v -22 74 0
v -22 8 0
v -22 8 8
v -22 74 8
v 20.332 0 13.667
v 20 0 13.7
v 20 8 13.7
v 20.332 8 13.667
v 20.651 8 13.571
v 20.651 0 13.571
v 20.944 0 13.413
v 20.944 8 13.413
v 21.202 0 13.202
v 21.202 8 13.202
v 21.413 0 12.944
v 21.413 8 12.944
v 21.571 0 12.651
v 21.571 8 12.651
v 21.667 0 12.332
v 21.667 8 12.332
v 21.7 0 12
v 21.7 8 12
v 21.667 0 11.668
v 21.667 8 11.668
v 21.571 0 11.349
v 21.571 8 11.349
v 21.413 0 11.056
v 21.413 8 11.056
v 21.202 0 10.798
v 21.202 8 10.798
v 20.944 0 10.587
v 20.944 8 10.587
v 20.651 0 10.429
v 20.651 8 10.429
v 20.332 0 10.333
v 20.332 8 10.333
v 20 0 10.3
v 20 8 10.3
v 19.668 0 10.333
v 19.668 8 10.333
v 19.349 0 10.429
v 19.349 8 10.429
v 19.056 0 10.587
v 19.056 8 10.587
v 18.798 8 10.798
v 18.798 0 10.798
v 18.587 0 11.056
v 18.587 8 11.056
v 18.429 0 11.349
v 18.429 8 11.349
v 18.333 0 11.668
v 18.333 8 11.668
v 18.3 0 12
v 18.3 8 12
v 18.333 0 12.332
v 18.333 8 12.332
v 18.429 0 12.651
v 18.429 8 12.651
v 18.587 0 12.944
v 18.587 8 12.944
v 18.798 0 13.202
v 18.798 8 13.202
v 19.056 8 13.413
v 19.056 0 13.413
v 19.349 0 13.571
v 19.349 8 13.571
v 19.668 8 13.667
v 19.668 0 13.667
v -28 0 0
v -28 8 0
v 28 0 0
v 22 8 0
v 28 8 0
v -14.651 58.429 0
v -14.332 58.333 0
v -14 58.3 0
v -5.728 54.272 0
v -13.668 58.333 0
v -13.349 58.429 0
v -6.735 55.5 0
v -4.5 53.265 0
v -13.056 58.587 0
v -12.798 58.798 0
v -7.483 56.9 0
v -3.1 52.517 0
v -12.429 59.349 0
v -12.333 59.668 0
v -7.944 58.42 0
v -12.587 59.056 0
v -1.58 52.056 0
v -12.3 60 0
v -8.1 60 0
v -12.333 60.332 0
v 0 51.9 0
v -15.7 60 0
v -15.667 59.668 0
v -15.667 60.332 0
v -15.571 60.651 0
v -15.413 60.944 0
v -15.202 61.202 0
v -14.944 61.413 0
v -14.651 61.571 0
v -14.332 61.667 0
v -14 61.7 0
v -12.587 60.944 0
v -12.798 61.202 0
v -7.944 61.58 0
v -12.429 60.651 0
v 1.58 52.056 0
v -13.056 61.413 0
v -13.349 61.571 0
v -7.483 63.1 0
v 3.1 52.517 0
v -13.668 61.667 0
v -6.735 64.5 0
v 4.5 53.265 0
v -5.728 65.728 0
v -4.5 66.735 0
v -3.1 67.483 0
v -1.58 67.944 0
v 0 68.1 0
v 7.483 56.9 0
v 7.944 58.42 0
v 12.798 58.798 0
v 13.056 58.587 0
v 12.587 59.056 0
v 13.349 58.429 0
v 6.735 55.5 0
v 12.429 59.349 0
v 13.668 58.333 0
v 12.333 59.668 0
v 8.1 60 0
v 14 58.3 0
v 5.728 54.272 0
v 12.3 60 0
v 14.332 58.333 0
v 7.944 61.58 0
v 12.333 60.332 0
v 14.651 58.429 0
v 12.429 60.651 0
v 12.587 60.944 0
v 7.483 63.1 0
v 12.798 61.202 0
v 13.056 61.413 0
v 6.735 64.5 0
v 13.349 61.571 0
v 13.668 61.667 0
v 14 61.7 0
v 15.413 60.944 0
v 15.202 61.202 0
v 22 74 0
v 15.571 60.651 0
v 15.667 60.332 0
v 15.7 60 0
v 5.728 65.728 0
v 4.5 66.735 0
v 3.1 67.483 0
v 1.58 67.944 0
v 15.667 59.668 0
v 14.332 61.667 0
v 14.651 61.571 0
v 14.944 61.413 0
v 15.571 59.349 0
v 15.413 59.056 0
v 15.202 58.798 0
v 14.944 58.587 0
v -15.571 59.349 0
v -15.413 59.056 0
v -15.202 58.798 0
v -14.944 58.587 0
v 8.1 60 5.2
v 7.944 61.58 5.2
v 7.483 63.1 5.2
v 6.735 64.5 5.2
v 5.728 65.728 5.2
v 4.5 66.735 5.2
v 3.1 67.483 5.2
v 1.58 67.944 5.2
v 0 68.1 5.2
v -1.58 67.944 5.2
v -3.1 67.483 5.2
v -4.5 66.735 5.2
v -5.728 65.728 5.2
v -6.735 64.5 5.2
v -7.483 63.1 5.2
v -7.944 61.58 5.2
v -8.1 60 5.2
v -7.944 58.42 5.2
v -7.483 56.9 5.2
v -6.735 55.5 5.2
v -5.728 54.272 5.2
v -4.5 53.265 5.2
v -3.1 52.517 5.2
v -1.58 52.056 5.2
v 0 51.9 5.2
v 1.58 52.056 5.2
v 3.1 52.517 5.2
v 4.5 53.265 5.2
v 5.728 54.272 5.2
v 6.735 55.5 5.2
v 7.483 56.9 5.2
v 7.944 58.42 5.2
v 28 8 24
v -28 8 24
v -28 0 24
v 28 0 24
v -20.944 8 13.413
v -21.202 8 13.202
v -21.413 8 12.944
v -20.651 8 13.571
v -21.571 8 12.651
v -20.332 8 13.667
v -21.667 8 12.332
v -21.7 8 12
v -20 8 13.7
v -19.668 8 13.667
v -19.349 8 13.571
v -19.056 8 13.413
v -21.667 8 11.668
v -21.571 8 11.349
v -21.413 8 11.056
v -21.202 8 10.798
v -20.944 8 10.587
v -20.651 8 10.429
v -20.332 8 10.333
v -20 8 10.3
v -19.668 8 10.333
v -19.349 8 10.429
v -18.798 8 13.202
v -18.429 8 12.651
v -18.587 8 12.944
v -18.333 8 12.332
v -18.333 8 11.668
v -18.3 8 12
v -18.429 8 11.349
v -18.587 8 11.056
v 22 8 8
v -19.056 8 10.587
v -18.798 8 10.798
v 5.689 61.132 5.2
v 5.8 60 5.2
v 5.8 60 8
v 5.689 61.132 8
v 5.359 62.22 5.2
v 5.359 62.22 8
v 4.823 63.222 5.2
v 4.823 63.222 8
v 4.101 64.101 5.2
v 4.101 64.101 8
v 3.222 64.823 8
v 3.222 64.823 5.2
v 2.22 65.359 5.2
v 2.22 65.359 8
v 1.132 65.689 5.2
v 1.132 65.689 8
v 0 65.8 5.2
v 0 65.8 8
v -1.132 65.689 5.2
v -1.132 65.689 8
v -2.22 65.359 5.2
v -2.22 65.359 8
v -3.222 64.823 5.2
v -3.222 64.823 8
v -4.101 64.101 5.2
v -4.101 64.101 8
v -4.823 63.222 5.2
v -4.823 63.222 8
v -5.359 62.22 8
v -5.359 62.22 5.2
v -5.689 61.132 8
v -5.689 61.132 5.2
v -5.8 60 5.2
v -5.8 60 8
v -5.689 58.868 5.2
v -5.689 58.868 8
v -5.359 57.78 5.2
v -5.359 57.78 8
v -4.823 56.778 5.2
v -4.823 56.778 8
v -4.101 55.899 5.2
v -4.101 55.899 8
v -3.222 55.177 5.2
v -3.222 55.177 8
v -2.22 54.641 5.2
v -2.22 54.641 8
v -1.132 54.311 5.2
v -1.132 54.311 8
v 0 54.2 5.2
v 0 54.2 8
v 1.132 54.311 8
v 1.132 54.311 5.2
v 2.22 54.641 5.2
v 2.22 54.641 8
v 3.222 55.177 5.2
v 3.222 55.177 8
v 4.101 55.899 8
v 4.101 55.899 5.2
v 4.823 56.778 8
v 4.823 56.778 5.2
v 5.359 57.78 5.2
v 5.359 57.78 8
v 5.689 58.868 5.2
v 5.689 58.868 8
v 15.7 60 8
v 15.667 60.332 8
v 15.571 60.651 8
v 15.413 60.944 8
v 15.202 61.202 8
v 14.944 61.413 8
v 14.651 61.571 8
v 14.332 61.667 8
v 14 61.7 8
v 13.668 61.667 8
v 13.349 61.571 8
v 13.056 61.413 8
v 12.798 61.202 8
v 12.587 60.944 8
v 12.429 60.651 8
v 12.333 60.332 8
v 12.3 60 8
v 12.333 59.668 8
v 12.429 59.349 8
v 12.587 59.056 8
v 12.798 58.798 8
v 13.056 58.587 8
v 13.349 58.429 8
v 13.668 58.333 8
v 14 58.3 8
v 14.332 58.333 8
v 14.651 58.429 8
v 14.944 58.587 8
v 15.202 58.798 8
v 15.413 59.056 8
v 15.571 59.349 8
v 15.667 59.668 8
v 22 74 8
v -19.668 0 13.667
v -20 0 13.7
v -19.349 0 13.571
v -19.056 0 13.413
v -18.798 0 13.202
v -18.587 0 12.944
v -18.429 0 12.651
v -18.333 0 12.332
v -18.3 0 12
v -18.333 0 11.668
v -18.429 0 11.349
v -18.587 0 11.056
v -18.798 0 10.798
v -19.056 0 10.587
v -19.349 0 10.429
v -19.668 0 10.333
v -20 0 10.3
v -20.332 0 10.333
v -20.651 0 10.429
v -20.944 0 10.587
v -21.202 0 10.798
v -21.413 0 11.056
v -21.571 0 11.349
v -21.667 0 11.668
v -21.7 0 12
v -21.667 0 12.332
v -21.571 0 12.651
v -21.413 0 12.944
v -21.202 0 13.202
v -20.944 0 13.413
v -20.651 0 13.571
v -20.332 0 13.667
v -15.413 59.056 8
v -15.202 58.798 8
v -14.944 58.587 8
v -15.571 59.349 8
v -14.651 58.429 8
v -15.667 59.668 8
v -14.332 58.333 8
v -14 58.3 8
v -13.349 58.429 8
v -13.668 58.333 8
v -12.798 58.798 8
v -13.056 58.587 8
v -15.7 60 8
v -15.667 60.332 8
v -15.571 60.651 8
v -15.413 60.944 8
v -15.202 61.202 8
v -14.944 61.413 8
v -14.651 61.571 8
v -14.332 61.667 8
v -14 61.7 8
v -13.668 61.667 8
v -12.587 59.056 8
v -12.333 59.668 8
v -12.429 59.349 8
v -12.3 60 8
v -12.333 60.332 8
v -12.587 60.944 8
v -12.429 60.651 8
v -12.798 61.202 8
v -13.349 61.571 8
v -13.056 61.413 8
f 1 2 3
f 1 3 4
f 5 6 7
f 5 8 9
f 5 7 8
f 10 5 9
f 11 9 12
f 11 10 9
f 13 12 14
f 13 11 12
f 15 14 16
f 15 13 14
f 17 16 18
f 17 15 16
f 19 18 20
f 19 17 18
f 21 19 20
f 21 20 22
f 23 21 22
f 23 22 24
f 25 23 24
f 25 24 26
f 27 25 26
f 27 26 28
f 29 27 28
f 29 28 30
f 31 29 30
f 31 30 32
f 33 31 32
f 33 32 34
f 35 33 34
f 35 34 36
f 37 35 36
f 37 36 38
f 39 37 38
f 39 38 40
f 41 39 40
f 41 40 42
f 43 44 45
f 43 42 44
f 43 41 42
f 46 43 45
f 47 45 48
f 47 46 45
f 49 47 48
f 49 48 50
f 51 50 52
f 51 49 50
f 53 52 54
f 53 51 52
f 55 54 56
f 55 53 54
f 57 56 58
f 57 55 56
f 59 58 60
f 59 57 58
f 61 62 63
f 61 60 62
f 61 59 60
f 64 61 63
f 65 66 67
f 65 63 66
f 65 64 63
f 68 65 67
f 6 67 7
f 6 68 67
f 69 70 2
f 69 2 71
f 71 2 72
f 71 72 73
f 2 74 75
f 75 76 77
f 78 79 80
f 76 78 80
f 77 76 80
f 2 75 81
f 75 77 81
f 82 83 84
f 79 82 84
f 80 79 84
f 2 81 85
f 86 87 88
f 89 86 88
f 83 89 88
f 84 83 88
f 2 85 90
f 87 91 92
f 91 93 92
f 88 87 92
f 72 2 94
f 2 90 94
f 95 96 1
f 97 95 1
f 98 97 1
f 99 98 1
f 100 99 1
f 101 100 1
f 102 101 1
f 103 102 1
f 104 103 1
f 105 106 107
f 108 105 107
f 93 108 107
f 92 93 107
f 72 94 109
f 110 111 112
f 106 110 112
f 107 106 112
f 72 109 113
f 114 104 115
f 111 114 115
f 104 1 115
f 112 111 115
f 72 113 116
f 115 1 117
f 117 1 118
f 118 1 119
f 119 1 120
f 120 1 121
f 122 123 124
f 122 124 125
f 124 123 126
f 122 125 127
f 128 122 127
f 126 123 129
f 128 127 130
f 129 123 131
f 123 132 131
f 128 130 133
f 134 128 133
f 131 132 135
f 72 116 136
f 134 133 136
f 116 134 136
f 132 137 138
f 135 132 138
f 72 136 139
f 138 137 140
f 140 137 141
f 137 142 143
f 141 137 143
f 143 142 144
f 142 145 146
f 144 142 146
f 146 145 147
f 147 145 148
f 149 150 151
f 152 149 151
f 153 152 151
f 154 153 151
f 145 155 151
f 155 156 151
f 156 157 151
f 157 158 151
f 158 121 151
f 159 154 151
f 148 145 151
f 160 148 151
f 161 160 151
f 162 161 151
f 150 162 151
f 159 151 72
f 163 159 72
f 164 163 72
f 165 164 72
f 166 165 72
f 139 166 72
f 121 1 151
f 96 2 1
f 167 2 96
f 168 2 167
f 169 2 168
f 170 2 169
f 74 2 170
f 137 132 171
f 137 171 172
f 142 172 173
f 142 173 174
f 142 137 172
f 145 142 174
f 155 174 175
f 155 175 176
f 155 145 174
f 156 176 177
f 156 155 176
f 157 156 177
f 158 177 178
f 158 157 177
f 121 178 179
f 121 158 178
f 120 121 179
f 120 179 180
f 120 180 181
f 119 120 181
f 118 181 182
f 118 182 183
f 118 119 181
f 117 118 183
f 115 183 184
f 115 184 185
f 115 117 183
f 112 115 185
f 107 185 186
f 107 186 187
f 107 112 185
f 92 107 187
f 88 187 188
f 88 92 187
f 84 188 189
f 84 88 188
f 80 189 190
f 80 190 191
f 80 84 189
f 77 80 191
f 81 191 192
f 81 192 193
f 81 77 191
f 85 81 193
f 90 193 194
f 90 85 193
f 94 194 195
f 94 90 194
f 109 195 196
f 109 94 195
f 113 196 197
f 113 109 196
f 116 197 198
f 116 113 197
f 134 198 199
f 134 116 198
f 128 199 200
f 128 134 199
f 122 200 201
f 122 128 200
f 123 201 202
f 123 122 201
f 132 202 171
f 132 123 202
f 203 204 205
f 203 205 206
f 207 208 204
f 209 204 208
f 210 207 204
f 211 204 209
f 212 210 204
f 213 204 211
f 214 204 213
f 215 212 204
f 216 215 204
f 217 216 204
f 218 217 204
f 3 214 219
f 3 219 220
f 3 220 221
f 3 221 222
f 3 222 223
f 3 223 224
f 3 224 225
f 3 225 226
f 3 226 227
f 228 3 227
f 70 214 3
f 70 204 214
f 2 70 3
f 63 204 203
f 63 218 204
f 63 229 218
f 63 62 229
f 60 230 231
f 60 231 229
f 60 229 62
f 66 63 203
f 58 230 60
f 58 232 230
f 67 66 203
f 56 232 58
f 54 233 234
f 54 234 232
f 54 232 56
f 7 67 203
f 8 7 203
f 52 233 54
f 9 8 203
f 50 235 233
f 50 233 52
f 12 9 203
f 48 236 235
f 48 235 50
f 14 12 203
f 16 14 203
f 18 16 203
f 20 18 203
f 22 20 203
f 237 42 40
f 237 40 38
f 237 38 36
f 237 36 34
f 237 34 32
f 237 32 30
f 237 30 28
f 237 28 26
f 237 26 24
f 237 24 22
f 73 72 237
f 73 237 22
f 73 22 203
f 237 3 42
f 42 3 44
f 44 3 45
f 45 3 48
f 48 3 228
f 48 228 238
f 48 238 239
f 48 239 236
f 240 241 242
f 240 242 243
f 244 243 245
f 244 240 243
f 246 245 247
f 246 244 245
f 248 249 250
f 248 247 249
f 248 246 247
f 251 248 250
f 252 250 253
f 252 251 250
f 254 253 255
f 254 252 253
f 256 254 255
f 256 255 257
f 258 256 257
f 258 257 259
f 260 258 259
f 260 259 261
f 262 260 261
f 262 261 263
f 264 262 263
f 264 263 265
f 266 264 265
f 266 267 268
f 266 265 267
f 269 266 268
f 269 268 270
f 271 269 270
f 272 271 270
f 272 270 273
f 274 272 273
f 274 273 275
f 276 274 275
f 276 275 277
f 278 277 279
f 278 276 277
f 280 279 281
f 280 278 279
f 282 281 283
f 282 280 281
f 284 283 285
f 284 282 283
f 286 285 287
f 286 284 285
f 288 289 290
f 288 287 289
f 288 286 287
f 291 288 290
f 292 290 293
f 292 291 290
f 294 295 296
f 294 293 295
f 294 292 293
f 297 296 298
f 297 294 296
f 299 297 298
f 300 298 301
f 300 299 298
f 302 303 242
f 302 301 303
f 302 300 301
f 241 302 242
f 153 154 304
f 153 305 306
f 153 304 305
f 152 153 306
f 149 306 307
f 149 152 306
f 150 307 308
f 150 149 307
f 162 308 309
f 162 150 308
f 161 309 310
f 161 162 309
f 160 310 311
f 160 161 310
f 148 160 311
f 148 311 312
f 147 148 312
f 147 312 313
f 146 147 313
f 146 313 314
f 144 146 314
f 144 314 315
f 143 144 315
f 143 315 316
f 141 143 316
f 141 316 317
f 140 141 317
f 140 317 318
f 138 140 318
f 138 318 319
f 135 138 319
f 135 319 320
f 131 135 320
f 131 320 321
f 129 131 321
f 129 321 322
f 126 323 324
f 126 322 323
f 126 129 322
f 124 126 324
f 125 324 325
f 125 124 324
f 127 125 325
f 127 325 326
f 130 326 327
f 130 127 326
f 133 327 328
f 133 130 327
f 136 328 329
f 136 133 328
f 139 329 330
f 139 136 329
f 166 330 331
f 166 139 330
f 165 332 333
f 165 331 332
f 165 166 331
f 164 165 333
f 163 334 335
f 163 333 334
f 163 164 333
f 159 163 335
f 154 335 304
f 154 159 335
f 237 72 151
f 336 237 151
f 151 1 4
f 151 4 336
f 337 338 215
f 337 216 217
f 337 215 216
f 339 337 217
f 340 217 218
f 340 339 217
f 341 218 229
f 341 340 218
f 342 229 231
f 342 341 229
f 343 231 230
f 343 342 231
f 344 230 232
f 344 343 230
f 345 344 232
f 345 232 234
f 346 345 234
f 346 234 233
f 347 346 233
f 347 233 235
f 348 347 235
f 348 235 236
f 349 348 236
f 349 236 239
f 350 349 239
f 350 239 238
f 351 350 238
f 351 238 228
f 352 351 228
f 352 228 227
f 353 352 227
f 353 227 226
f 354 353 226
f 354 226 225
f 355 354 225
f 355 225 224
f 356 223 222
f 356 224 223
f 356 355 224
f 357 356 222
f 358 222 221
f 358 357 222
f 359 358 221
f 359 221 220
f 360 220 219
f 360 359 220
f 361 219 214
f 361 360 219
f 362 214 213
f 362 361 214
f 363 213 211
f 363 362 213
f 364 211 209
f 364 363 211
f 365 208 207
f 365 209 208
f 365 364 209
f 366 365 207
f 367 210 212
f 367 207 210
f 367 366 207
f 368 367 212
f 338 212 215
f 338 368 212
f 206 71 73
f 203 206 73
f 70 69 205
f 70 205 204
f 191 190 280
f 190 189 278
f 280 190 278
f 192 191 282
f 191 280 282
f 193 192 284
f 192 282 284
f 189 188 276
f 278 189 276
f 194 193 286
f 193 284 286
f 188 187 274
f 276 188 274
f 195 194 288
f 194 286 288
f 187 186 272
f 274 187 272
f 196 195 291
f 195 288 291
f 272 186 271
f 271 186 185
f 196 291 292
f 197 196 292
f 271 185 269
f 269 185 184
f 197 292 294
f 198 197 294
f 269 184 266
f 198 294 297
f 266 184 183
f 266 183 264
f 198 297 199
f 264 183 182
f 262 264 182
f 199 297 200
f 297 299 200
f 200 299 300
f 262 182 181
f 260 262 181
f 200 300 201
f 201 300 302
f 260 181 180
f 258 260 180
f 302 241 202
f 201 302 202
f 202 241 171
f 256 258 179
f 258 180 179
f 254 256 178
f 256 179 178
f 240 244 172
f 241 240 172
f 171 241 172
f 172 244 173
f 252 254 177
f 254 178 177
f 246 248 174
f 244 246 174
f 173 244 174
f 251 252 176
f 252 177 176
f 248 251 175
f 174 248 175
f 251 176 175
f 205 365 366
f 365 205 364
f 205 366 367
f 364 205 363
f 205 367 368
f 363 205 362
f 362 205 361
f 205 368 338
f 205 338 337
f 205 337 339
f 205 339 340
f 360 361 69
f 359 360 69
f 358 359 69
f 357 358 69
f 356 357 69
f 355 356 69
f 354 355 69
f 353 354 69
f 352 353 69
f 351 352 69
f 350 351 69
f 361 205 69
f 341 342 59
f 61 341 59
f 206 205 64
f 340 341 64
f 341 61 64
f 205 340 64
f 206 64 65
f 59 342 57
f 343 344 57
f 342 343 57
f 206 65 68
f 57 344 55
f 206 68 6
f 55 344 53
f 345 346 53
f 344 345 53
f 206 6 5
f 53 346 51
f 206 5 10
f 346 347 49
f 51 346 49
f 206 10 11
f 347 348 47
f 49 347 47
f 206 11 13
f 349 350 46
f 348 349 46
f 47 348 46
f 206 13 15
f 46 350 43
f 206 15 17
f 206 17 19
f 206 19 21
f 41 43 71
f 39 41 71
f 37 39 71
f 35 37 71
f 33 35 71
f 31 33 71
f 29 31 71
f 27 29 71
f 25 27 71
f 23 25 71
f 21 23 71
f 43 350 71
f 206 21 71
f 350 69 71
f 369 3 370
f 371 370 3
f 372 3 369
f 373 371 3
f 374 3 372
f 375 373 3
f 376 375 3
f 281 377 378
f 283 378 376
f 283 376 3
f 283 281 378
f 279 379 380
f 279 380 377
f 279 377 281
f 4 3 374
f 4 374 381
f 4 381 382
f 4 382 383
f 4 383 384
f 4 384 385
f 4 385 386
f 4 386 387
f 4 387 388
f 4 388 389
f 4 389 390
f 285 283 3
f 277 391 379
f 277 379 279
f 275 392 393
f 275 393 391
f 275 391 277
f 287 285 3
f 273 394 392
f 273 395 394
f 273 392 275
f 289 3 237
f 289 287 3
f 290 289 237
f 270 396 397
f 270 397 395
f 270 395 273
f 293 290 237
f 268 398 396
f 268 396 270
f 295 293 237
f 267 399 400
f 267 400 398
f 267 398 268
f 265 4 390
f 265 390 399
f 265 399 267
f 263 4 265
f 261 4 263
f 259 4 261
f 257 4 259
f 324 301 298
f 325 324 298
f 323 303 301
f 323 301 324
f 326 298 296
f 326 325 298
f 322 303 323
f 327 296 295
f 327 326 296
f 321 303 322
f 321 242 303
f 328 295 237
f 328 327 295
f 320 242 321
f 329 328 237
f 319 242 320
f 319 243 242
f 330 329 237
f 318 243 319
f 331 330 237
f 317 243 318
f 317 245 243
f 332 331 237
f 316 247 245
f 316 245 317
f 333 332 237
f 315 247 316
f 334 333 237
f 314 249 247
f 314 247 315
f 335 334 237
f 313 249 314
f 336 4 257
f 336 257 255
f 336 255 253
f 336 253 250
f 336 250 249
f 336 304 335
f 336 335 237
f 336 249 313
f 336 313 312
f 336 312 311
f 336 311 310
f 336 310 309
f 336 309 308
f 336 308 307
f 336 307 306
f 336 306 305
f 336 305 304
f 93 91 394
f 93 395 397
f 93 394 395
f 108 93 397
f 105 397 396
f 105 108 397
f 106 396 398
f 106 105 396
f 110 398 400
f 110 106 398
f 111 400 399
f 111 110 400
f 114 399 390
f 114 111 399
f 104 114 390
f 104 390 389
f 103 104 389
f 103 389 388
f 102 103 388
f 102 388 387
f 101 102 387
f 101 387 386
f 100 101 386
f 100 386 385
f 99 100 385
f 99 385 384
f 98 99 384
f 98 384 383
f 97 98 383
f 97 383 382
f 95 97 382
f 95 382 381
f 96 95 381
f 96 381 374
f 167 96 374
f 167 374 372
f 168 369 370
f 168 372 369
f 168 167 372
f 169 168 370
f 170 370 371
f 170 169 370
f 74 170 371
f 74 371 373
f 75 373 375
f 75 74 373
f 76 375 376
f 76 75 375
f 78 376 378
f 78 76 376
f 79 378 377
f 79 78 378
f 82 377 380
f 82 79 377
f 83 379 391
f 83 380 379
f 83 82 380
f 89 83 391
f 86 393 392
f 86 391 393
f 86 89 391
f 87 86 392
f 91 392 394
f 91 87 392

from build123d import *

# Parameters (mm, degrees)
SKETCH_1_W                                   = 56
SKETCH_1_H                                   = 8
FOOT_56X24X8_DEPTH                           = 24
SKETCH_2_W                                   = 44
SKETCH_2_H                                   = 74
TOWER_PIVOT_HEIGHT60_DEPTH                   = 8
SHAFT_ACCESS_AND_RETAINER_M3_DEPTH           = 83.680106434
SHAFT_ACCESS_AND_RETAINER_M3_DEPTH_BACK      = 83.680106434
SKETCH_3_R                                   = 5.8
SKETCH_3_R_2                                 = 1.7
SKETCH_4_R                                   = 8.1
F_625ZZ_POCKET_D16P2_DEPTH5P2_TEST_FIT_DEPTH = 5.2
FOOT_M3_THROUGH_DEPTH                        = 83.680106434
FOOT_M3_THROUGH_DEPTH_BACK                   = 83.680106434
SKETCH_5_R                                   = 1.7


with BuildPart() as part:
    # 草图1 → Foot_56x24x8 (new body)
    with BuildSketch(Plane.XY):
        with Locations((0, 4)):
            Rectangle(SKETCH_1_W, SKETCH_1_H)
    extrude(amount=FOOT_56X24X8_DEPTH)

    # 草图2 → Tower_pivot_height60 (add)
    with BuildSketch(Plane.XY):
        with Locations((0, 37)):
            Rectangle(SKETCH_2_W, SKETCH_2_H)
    extrude(amount=TOWER_PIVOT_HEIGHT60_DEPTH)

    # 草图3 → Shaft_access_and_retainer_M3 (cut, two sides: drawn at the far end of the back side and taken through both)
    with BuildSketch(Plane.XY.offset(-SHAFT_ACCESS_AND_RETAINER_M3_DEPTH_BACK)):
        with Locations((0, 60)):
            Circle(SKETCH_3_R)
        with Locations((-14, 60)):
            Circle(SKETCH_3_R_2)
        with Locations((14, 60)):
            Circle(SKETCH_3_R_2)
    extrude(amount=SHAFT_ACCESS_AND_RETAINER_M3_DEPTH + SHAFT_ACCESS_AND_RETAINER_M3_DEPTH_BACK, mode=Mode.SUBTRACT)

    # 草图4 → 625ZZ_pocket_D16p2_depth5p2_TEST_FIT (cut)
    with BuildSketch(Plane.XY):
        with Locations((0, 60)):
            Circle(SKETCH_4_R)
    extrude(amount=F_625ZZ_POCKET_D16P2_DEPTH5P2_TEST_FIT_DEPTH, mode=Mode.SUBTRACT)

    # 草图5 → Foot_M3_through (cut, two sides: drawn at the far end of the back side and taken through both)
    with BuildSketch(Plane(origin=(0, 0, 0), x_dir=(1, 0, 0), z_dir=(0, 1, 0)).offset(-FOOT_M3_THROUGH_DEPTH_BACK)):
        with Locations(Location((-20, -12, 0), (0, 0, 270))):
            Circle(SKETCH_5_R)
        with Locations(Location((20, -12, 0), (0, 0, 270))):
            Circle(SKETCH_5_R)
    extrude(amount=FOOT_M3_THROUGH_DEPTH + FOOT_M3_THROUGH_DEPTH_BACK, mode=Mode.SUBTRACT)


solid = part.part
